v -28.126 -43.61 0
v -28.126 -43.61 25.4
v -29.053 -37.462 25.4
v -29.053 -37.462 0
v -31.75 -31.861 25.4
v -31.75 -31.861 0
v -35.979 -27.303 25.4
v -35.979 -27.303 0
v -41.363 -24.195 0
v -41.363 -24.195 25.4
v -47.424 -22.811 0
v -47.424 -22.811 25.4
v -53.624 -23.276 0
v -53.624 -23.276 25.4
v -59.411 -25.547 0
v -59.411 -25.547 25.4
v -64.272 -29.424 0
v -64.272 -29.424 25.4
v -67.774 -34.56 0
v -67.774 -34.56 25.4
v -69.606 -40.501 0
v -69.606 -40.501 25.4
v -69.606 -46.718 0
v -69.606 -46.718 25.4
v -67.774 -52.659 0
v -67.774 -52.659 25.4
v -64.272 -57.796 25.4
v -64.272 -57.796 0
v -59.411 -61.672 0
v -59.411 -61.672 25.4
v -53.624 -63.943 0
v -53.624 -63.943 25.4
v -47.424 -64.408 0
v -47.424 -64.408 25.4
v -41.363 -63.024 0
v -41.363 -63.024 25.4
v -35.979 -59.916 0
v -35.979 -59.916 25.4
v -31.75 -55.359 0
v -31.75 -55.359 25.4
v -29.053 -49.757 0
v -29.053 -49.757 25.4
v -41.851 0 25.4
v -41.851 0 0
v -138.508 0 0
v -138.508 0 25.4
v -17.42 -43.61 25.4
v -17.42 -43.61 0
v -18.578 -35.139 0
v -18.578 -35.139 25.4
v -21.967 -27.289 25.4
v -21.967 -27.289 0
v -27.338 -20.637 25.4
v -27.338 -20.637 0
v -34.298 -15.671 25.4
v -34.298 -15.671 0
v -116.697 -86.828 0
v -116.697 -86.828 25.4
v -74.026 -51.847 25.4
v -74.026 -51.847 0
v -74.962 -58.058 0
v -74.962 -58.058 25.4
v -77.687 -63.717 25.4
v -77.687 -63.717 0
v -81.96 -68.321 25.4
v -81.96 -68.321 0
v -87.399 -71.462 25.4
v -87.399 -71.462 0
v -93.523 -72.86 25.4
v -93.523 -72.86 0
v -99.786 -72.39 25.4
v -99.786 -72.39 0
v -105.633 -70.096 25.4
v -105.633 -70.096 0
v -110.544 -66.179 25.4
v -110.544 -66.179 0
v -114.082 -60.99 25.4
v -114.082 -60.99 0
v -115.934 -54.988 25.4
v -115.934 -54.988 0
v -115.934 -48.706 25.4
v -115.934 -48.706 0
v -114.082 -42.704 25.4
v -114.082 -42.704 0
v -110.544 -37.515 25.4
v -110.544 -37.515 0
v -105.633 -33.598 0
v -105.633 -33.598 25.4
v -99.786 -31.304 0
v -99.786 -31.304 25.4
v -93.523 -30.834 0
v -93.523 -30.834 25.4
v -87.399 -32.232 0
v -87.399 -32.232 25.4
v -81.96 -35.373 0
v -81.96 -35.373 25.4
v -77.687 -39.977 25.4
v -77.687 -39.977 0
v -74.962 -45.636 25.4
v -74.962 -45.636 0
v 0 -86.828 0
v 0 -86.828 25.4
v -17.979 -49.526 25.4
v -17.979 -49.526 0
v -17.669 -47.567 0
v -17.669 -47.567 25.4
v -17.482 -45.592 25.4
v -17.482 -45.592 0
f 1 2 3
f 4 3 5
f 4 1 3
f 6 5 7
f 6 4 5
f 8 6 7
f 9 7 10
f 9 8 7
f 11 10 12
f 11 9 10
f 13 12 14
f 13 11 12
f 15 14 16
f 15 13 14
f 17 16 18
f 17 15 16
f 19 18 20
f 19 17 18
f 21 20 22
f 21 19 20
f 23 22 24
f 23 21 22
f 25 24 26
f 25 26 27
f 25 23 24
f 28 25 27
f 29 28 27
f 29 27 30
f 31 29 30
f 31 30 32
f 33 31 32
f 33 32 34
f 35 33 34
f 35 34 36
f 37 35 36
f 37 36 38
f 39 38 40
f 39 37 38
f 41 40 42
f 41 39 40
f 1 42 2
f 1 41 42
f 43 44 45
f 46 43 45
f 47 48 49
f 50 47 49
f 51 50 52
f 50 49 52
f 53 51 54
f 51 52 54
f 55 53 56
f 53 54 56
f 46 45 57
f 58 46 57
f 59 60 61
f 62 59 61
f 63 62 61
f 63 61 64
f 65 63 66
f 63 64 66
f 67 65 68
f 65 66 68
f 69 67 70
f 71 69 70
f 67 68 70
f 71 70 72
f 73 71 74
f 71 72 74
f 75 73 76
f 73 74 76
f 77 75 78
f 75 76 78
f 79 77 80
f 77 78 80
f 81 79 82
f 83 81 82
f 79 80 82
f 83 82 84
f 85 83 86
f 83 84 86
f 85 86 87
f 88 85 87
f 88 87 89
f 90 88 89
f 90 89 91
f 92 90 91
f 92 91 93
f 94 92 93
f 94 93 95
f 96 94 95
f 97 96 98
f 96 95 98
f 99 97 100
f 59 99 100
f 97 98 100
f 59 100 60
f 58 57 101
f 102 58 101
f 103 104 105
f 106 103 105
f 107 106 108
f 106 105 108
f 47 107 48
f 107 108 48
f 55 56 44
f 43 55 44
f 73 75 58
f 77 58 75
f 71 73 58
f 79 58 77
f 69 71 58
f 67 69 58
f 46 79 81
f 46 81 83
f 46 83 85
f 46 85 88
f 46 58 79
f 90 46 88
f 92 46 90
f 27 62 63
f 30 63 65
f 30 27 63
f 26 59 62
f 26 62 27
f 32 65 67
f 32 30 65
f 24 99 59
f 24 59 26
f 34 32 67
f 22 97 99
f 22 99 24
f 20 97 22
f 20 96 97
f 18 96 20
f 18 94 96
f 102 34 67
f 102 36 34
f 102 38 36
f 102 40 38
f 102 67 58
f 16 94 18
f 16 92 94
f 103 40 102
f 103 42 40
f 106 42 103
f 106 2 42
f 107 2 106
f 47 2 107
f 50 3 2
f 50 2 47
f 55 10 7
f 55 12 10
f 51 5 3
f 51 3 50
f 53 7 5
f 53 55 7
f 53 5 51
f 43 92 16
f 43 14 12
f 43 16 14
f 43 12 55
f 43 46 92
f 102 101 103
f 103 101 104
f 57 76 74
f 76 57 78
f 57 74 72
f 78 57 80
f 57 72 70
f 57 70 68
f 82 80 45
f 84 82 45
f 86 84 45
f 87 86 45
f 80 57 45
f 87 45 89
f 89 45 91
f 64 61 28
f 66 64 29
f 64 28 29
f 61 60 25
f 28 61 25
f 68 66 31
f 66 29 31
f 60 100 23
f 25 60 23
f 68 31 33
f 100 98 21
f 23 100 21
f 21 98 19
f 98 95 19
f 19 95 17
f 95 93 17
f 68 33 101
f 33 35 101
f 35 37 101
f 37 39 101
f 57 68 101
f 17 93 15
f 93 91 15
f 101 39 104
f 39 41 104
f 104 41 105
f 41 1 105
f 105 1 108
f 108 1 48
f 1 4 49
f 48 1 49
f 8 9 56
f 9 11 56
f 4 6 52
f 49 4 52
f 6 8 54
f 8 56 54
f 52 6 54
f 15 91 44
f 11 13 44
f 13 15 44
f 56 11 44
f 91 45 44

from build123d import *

# Parameters (mm, degrees)
F0_R     = 20.8565821632
F1_DEPTH = 25.4


with BuildPart() as f1:
    # F0 (on Top) → F1 (new body)
    with BuildSketch(Plane.XY):
        with BuildLine():
            Line((-41.851490736, 0), (-138.5076195002, 0))
            Line((-138.5076195002, 0), (-116.6970655322, -86.8278518319))
            Line((-116.6970655322, -86.8278518319), (0, -86.8278518319))
            Line((0, -86.8278518319), (-17.9794709813, -49.5264602942))
            ThreePointArc((-17.9794709813, -49.5264602942), (-43.2116401305, -74.6403530851), (-75.7857334668, -60.2772609946))
            ThreePointArc((-75.7857334668, -60.2772609946), (-115.8407580084, -55.5523652684), (-79.8986506619, -37.2522409479))
            ThreePointArc((-79.8986506619, -37.2522409479), (-62.4846109467, -15.0805313011), (-34.2980027941, -15.6709622596))
            Line((-34.2980027941, -15.6709622596), (-41.851490736, 0))
        make_face()
        with BuildLine():
            ThreePointArc((-17.4199218149, -43.6096377671), (-21.9669745384, -27.2891046366), (-34.2980027941, -15.6709622596))
            Line((-34.2980027941, -15.6709622596), (-17.9794709813, -49.5264602942))
            ThreePointArc((-17.9794709813, -49.5264602942), (-17.5601204804, -46.5812486134), (-17.4199218149, -43.6096377671))
        make_face()
        with BuildLine():
            Line((-17.9794709813, -49.5264602942), (-34.2980027941, -15.6709622596))
            ThreePointArc((-34.2980027941, -15.6709622596), (-62.4846109467, -15.0805313011), (-79.8986506619, -37.2522409479))
            ThreePointArc((-79.8986506619, -37.2522409479), (-75.5491310736, -43.9810085097), (-74.0258815603, -51.8470332026))
            ThreePointArc((-74.0258815603, -51.8470332026), (-74.4705361025, -56.1530121668), (-75.7857334668, -60.2772609946))
            ThreePointArc((-75.7857334668, -60.2772609946), (-43.2116401305, -74.6403530851), (-17.9794709813, -49.5264602942))
        make_face()
        with Locations((-48.9827282727, -43.6096377671)):
            Circle(F0_R, mode=Mode.SUBTRACT)
    extrude(amount=F1_DEPTH)


solid = f1.part
